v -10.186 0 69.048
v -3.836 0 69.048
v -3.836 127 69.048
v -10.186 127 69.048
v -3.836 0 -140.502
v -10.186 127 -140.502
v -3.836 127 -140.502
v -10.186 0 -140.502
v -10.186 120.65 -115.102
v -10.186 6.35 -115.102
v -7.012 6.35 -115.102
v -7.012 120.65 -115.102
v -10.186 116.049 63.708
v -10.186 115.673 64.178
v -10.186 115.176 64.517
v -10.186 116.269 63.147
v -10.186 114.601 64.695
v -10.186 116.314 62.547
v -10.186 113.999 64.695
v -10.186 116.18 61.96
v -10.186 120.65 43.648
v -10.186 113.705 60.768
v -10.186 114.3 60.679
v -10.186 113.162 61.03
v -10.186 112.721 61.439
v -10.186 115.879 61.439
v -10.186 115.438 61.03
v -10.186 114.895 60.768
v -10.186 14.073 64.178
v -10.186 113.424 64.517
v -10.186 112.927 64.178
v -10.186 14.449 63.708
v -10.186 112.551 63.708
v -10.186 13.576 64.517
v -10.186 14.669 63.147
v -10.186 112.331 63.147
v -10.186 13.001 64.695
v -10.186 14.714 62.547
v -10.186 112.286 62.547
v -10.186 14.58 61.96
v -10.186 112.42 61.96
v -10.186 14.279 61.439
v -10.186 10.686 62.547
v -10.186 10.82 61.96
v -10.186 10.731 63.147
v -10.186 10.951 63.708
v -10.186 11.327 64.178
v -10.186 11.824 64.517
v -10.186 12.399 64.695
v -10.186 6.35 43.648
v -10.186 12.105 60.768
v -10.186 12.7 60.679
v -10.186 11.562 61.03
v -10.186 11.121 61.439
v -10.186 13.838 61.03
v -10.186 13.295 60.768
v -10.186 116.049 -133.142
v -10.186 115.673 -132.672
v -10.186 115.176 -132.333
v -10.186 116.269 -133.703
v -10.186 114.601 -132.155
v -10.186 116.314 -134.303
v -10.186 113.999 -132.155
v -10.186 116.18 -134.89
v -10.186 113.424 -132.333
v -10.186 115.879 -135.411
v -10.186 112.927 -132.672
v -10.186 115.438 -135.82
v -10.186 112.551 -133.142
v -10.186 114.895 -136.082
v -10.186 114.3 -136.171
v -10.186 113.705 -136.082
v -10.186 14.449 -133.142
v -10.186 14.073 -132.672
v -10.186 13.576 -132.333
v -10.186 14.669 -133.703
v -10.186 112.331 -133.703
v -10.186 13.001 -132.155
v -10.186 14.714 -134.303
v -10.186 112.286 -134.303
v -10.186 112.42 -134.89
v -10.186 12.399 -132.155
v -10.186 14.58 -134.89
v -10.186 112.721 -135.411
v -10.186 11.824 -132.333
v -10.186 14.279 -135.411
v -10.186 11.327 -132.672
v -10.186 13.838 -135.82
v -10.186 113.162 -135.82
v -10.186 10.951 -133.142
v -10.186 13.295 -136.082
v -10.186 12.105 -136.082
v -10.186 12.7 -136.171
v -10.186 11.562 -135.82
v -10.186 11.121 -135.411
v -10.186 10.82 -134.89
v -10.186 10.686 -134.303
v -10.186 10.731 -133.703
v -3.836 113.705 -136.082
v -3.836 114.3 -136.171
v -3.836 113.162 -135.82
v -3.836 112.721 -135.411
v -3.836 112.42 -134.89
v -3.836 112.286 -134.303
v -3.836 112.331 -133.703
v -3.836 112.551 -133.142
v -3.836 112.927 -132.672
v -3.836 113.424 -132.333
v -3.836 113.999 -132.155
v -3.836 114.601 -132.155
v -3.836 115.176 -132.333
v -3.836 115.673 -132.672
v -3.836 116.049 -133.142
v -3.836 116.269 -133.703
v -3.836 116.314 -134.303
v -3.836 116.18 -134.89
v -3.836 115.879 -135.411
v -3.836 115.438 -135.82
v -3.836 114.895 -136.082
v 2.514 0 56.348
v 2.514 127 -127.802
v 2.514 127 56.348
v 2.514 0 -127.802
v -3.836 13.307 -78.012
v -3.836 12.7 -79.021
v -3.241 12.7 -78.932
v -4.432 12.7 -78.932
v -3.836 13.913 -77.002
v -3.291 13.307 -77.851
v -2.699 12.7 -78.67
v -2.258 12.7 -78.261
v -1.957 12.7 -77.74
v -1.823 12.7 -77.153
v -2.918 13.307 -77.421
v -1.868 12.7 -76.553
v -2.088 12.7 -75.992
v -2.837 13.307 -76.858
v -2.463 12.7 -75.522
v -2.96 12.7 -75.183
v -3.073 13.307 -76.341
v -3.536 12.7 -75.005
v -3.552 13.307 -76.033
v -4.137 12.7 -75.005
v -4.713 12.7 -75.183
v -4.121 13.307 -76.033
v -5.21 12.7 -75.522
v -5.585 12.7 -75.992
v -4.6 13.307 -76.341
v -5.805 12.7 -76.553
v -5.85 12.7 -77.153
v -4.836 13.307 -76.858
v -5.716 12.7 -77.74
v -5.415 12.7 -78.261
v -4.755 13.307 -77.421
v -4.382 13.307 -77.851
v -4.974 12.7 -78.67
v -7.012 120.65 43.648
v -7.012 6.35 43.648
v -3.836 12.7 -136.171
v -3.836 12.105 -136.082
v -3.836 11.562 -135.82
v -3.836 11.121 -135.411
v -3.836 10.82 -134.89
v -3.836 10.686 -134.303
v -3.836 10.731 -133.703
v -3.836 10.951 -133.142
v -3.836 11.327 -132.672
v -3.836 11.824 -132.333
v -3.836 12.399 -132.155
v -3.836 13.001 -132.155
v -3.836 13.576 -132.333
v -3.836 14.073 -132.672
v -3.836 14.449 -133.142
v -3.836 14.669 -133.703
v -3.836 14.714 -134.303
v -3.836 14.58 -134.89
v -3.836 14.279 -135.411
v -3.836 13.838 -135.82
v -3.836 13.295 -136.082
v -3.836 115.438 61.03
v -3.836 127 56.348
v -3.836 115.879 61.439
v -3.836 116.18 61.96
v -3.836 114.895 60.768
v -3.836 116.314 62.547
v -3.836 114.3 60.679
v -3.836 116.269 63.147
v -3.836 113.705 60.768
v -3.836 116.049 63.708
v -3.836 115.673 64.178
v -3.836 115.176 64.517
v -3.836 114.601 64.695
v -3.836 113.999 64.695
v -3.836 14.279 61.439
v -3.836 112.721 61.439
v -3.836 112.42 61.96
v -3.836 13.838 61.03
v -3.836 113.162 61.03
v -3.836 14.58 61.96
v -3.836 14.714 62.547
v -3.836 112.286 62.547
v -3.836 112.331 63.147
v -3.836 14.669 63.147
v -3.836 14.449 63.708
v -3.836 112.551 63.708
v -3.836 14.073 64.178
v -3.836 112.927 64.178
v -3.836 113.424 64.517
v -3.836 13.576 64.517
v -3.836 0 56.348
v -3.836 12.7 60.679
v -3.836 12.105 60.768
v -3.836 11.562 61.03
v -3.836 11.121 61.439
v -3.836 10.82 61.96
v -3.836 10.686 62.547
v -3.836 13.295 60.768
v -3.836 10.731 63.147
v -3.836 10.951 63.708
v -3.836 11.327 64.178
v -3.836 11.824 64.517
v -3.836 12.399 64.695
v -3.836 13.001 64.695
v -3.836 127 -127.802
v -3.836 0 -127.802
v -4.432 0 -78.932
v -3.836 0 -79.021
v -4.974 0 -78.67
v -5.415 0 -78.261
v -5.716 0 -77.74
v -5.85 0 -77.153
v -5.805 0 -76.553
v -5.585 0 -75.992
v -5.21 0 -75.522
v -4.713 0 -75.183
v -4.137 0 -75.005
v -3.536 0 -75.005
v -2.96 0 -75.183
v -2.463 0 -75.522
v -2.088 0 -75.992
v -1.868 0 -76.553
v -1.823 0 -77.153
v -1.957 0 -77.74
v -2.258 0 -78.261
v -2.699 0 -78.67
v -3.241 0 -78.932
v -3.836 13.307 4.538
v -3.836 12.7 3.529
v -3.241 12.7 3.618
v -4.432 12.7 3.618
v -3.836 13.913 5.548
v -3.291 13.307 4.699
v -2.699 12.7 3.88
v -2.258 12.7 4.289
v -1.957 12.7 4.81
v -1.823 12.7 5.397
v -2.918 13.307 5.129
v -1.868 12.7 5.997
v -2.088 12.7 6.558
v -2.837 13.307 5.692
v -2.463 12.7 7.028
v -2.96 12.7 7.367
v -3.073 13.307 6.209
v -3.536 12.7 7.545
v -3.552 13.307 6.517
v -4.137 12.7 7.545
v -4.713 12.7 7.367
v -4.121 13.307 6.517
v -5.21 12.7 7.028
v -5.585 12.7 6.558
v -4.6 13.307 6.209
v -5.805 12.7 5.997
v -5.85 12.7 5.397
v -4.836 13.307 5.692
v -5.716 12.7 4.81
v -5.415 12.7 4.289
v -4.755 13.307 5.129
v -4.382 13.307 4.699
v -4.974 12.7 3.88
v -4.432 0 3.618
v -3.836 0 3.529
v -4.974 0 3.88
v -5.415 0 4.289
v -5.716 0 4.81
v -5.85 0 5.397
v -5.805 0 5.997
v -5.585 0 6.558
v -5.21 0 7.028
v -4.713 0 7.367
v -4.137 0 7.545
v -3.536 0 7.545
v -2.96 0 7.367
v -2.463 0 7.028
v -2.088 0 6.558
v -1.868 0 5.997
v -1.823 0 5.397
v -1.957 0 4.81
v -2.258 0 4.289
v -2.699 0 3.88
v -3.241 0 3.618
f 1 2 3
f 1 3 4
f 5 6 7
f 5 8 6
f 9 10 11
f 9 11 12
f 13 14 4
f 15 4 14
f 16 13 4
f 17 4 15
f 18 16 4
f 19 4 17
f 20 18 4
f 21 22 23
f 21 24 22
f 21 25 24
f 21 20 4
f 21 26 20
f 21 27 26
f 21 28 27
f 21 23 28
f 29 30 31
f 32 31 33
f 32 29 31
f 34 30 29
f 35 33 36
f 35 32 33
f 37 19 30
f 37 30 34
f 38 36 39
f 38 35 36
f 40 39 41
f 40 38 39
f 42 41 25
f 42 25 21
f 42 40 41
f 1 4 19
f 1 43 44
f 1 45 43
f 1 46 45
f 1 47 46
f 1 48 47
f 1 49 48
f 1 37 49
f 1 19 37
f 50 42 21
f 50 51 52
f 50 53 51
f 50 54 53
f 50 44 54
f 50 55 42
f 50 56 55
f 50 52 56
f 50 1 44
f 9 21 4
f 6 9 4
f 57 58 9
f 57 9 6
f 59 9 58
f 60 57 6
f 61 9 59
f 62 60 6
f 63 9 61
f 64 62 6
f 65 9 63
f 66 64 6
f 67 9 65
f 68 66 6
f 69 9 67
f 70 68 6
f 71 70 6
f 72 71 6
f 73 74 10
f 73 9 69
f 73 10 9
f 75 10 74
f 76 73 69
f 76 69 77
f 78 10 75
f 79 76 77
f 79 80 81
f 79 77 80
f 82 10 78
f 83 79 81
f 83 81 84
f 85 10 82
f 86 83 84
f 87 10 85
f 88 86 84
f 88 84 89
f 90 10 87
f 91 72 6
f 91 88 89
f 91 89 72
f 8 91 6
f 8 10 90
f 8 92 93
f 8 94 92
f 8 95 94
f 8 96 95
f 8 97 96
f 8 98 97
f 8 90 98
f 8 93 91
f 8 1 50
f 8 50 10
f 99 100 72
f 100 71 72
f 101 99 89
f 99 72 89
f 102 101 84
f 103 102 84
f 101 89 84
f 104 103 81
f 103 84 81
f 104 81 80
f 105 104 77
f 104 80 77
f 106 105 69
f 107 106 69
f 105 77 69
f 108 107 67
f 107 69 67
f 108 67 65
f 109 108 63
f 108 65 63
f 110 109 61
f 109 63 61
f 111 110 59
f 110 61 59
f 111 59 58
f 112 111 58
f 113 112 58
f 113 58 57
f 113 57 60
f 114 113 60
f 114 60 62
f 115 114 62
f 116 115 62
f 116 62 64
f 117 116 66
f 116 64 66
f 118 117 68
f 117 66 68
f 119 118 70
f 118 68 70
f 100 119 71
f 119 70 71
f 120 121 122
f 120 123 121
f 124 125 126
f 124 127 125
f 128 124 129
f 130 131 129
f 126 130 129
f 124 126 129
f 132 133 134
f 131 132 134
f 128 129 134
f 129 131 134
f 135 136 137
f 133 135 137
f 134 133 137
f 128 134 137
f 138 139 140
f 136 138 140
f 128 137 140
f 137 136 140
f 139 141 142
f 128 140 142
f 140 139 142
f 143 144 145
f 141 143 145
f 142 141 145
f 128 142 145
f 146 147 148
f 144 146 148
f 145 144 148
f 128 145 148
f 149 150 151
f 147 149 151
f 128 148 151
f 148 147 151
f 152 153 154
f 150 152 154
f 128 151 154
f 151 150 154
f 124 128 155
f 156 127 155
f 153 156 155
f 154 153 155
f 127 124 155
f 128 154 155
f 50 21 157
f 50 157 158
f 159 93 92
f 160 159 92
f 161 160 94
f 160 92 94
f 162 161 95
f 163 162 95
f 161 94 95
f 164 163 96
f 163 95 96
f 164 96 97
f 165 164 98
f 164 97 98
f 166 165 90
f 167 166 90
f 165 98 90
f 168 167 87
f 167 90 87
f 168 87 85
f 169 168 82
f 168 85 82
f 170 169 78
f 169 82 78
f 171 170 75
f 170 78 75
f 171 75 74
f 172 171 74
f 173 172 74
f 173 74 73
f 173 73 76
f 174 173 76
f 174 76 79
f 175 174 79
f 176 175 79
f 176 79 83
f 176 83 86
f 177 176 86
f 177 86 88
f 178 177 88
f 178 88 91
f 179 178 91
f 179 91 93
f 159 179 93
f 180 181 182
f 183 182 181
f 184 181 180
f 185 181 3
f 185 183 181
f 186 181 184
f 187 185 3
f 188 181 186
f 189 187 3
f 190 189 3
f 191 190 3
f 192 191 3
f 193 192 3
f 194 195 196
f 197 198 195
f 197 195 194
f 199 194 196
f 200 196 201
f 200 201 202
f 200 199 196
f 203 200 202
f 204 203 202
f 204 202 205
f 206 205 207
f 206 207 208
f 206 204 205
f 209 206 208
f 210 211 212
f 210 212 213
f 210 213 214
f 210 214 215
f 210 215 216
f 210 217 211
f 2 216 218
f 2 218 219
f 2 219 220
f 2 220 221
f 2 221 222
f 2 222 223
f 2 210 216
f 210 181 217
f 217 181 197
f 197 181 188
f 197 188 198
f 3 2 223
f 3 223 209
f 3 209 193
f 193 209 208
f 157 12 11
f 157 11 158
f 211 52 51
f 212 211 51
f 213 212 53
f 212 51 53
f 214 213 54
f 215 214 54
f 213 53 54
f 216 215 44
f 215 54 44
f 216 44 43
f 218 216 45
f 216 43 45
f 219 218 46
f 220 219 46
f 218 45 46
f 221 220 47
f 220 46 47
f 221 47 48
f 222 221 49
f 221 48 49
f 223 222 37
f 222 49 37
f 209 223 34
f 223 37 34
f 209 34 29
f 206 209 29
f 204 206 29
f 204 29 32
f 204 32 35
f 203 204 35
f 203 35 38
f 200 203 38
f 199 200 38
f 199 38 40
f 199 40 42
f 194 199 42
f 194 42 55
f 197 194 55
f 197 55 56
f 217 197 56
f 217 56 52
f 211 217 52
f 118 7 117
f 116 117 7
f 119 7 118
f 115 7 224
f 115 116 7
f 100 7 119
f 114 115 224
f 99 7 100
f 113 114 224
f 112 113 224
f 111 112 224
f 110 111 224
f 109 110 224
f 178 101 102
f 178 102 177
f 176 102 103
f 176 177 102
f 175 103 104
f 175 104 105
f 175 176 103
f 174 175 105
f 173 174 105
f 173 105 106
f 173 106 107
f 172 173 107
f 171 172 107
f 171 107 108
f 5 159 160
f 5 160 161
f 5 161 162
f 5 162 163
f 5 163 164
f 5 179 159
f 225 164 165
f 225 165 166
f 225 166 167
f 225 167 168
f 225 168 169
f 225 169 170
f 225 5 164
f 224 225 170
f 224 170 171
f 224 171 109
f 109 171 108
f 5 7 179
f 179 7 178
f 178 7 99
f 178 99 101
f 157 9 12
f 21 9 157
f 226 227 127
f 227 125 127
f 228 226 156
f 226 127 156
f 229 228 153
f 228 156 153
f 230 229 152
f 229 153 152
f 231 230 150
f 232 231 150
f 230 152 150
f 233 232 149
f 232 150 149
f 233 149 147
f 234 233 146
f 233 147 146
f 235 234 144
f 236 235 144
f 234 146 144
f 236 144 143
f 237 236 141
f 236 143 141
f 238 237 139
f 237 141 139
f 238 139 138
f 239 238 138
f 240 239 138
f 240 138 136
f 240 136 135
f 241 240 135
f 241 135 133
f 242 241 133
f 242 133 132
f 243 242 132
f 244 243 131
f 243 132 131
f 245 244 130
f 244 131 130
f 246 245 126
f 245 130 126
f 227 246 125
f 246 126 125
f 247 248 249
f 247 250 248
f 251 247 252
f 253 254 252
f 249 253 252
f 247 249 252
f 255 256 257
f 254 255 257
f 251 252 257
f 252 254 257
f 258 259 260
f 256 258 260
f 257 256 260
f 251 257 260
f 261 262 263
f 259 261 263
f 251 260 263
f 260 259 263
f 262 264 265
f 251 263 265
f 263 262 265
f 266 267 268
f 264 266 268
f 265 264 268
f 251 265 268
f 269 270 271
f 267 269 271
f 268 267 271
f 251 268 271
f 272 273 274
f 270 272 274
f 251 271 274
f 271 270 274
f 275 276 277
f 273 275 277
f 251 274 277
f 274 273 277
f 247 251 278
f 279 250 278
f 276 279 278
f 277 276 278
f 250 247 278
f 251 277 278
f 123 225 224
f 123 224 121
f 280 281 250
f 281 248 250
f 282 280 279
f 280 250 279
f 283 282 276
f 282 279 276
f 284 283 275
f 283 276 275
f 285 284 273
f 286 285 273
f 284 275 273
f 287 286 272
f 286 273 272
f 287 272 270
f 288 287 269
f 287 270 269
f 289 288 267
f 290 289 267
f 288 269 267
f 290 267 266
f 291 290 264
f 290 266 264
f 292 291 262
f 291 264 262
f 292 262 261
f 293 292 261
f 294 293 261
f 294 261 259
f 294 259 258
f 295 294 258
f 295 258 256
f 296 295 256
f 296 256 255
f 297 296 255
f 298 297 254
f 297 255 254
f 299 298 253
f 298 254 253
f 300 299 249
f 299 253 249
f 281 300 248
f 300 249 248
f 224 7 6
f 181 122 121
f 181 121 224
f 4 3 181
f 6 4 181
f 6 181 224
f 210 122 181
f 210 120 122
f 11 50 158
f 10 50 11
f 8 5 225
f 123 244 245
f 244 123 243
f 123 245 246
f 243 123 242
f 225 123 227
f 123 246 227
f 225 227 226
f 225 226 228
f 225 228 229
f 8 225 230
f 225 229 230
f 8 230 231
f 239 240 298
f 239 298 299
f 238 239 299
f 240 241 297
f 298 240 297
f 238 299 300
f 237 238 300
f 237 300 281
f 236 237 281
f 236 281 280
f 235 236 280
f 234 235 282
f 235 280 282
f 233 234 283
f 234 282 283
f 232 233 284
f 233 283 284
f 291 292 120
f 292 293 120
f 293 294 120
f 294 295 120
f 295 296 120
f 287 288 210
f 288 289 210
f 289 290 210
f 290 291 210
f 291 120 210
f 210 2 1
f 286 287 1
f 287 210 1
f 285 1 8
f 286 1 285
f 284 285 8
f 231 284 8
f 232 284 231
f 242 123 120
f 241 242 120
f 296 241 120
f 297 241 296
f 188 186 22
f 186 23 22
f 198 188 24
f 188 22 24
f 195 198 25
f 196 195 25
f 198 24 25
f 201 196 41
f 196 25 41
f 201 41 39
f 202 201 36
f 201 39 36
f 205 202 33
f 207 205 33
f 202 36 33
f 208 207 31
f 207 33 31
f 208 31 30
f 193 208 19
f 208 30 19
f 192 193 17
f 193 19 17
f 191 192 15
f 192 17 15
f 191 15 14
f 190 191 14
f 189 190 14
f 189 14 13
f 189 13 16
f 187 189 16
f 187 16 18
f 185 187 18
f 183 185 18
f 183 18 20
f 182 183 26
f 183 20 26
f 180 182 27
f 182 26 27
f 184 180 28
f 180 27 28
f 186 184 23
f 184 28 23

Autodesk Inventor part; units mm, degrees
ref_plane "YZ Plane" through (0, 0, 0) normal (1, 0, 0) x (0, 1, 0)
ref_plane "XZ Plane" through (0, 0, 0) normal (0, 1, 0) x (-1, 0, 0)
ref_plane "XY Plane" through (0, 0, 0) normal (0, 0, 1) x (1, 0, 0)
sketch "Sketch1" plane through (0, 0, 0) normal (0, 1, 0) x (-1, 0, 0)
  line L0 (10.1865, 69.048) -> (10.1865, -140.502)
  line L1 (10.1865, -140.502) -> (3.8365, -140.502)
  line L2 (3.8365, -140.502) -> (3.8365, -127.802)
  line L3 (3.8365, -127.802) -> (-2.5135, -127.802)
  line L4 (-2.5135, -127.802) -> (-2.5135, 56.348)
  line L5 (-2.5135, 56.348) -> (3.8365, 56.348)
  line L6 (3.8365, 56.348) -> (3.8365, 69.048)
  line L7 (3.8365, 69.048) -> (10.1865, 69.048)
  point P0 (0, 0)
  dimension "d0" = 184.15
  dimension "d1" = 6.35
  dimension "d2" = 6.35
  dimension "d3" = 12.7
  dimension "d4" = 12.7
  dimension "d5" = 6.35
extrude "Extrusion1" add sketch "Sketch1" along normal blind 127
sketch "Sketch2" plane through (-3.8365, 0, 69.048) normal (1, 0, 0) x (0, 0, -1)
  line L0 (12.7, 0) -> (0, 0) projected
  line L1 (0, 0) -> (0, 127) projected
  line L2 (0, 127) -> (12.7, 127) projected
  point P0 (69.048, 0)
  point P1 (6.35, 114.3)
  point P2 (6.35, 12.7)
  dimension "d8" = 12.7
  dimension "d9" = 6.35
  dimension "d10" = 6.35
  dimension "d11" = 12.7
hole "Hole1" at (-3.8365, 114.3, 62.698) at (-3.8365, 12.7, 62.698) direction (-1, 0, 0) diameter 4.0386 depth 25.4 tip angle 118
sketch "Sketch3" plane through (-3.8365, 0, -127.802) normal (1, 0, 0) x (0, 0, -1)
  line L0 (12.7, 0) -> (0, 0) projected
  line L1 (12.7, 0) -> (12.7, 127) projected
  line L2 (12.7, 127) -> (-196.85, 127) projected
  point P0 (-127.802, 0)
  point P1 (6.35, 114.3)
  point P2 (6.35, 12.7)
  dimension "d19" = 12.7
  dimension "d20" = 6.35
  dimension "d21" = 6.35
  dimension "d22" = 12.7
hole "Hole2" at (-3.8365, 114.3, -134.152) at (-3.8365, 12.7, -134.152) direction (-1, 0, 0) diameter 4.0386 depth 25.4 tip angle 118
sketch "Sketch4" plane through (-10.1865, 0, -140.502) normal (-1, 0, 0) x (0, 0, 1)
  line L0 (25.4, 120.65) -> (184.15, 120.65)
  line L1 (184.15, 120.65) -> (184.15, 6.35)
  line L2 (184.15, 6.35) -> (25.4, 6.35)
  line L3 (25.4, 6.35) -> (25.4, 120.65)
  line L4 (196.85, 127) -> (12.7, 127) projected
  line L5 (209.55, 0) -> (0, 0) projected
  line L6 (0, 0) -> (0, 127) projected
  line L7 (209.55, 0) -> (209.55, 127) projected
  point P0 (140.502, 0)
  dimension "d30" = 6.35
  dimension "d31" = 6.35
  dimension "d32" = 25.4
  dimension "d33" = 25.4
extrude "Extrusion2" cut sketch "Sketch4" against normal blind 3.175
sketch "Sketch5" plane through (0, 0, 0) normal (0, -1, 0) x (1, 0, 0)
  line L0 (2.5135, -127.802) -> (2.5135, 56.348) projected
  line L1 (-10.1865, -140.502) -> (-3.8365, -140.502) projected
  line L2 (-3.8365, 69.048) -> (-10.1865, 69.048) projected
  point P0 (0, 0)
  point P1 (-3.8365, -77.002)
  point P2 (-3.8365, 5.548)
  dimension "d36" = 6.35
  dimension "d37" = 6.35
  dimension "d38" = 63.5
  dimension "d39" = 63.5
hole "Hole3" at (-3.8365, 0, -77.002) at (-3.8365, 0, 5.548) direction (0, 1, 0) diameter 4.0386 depth 12.7 tip angle 118
properties part number "BatteryHighFront"
